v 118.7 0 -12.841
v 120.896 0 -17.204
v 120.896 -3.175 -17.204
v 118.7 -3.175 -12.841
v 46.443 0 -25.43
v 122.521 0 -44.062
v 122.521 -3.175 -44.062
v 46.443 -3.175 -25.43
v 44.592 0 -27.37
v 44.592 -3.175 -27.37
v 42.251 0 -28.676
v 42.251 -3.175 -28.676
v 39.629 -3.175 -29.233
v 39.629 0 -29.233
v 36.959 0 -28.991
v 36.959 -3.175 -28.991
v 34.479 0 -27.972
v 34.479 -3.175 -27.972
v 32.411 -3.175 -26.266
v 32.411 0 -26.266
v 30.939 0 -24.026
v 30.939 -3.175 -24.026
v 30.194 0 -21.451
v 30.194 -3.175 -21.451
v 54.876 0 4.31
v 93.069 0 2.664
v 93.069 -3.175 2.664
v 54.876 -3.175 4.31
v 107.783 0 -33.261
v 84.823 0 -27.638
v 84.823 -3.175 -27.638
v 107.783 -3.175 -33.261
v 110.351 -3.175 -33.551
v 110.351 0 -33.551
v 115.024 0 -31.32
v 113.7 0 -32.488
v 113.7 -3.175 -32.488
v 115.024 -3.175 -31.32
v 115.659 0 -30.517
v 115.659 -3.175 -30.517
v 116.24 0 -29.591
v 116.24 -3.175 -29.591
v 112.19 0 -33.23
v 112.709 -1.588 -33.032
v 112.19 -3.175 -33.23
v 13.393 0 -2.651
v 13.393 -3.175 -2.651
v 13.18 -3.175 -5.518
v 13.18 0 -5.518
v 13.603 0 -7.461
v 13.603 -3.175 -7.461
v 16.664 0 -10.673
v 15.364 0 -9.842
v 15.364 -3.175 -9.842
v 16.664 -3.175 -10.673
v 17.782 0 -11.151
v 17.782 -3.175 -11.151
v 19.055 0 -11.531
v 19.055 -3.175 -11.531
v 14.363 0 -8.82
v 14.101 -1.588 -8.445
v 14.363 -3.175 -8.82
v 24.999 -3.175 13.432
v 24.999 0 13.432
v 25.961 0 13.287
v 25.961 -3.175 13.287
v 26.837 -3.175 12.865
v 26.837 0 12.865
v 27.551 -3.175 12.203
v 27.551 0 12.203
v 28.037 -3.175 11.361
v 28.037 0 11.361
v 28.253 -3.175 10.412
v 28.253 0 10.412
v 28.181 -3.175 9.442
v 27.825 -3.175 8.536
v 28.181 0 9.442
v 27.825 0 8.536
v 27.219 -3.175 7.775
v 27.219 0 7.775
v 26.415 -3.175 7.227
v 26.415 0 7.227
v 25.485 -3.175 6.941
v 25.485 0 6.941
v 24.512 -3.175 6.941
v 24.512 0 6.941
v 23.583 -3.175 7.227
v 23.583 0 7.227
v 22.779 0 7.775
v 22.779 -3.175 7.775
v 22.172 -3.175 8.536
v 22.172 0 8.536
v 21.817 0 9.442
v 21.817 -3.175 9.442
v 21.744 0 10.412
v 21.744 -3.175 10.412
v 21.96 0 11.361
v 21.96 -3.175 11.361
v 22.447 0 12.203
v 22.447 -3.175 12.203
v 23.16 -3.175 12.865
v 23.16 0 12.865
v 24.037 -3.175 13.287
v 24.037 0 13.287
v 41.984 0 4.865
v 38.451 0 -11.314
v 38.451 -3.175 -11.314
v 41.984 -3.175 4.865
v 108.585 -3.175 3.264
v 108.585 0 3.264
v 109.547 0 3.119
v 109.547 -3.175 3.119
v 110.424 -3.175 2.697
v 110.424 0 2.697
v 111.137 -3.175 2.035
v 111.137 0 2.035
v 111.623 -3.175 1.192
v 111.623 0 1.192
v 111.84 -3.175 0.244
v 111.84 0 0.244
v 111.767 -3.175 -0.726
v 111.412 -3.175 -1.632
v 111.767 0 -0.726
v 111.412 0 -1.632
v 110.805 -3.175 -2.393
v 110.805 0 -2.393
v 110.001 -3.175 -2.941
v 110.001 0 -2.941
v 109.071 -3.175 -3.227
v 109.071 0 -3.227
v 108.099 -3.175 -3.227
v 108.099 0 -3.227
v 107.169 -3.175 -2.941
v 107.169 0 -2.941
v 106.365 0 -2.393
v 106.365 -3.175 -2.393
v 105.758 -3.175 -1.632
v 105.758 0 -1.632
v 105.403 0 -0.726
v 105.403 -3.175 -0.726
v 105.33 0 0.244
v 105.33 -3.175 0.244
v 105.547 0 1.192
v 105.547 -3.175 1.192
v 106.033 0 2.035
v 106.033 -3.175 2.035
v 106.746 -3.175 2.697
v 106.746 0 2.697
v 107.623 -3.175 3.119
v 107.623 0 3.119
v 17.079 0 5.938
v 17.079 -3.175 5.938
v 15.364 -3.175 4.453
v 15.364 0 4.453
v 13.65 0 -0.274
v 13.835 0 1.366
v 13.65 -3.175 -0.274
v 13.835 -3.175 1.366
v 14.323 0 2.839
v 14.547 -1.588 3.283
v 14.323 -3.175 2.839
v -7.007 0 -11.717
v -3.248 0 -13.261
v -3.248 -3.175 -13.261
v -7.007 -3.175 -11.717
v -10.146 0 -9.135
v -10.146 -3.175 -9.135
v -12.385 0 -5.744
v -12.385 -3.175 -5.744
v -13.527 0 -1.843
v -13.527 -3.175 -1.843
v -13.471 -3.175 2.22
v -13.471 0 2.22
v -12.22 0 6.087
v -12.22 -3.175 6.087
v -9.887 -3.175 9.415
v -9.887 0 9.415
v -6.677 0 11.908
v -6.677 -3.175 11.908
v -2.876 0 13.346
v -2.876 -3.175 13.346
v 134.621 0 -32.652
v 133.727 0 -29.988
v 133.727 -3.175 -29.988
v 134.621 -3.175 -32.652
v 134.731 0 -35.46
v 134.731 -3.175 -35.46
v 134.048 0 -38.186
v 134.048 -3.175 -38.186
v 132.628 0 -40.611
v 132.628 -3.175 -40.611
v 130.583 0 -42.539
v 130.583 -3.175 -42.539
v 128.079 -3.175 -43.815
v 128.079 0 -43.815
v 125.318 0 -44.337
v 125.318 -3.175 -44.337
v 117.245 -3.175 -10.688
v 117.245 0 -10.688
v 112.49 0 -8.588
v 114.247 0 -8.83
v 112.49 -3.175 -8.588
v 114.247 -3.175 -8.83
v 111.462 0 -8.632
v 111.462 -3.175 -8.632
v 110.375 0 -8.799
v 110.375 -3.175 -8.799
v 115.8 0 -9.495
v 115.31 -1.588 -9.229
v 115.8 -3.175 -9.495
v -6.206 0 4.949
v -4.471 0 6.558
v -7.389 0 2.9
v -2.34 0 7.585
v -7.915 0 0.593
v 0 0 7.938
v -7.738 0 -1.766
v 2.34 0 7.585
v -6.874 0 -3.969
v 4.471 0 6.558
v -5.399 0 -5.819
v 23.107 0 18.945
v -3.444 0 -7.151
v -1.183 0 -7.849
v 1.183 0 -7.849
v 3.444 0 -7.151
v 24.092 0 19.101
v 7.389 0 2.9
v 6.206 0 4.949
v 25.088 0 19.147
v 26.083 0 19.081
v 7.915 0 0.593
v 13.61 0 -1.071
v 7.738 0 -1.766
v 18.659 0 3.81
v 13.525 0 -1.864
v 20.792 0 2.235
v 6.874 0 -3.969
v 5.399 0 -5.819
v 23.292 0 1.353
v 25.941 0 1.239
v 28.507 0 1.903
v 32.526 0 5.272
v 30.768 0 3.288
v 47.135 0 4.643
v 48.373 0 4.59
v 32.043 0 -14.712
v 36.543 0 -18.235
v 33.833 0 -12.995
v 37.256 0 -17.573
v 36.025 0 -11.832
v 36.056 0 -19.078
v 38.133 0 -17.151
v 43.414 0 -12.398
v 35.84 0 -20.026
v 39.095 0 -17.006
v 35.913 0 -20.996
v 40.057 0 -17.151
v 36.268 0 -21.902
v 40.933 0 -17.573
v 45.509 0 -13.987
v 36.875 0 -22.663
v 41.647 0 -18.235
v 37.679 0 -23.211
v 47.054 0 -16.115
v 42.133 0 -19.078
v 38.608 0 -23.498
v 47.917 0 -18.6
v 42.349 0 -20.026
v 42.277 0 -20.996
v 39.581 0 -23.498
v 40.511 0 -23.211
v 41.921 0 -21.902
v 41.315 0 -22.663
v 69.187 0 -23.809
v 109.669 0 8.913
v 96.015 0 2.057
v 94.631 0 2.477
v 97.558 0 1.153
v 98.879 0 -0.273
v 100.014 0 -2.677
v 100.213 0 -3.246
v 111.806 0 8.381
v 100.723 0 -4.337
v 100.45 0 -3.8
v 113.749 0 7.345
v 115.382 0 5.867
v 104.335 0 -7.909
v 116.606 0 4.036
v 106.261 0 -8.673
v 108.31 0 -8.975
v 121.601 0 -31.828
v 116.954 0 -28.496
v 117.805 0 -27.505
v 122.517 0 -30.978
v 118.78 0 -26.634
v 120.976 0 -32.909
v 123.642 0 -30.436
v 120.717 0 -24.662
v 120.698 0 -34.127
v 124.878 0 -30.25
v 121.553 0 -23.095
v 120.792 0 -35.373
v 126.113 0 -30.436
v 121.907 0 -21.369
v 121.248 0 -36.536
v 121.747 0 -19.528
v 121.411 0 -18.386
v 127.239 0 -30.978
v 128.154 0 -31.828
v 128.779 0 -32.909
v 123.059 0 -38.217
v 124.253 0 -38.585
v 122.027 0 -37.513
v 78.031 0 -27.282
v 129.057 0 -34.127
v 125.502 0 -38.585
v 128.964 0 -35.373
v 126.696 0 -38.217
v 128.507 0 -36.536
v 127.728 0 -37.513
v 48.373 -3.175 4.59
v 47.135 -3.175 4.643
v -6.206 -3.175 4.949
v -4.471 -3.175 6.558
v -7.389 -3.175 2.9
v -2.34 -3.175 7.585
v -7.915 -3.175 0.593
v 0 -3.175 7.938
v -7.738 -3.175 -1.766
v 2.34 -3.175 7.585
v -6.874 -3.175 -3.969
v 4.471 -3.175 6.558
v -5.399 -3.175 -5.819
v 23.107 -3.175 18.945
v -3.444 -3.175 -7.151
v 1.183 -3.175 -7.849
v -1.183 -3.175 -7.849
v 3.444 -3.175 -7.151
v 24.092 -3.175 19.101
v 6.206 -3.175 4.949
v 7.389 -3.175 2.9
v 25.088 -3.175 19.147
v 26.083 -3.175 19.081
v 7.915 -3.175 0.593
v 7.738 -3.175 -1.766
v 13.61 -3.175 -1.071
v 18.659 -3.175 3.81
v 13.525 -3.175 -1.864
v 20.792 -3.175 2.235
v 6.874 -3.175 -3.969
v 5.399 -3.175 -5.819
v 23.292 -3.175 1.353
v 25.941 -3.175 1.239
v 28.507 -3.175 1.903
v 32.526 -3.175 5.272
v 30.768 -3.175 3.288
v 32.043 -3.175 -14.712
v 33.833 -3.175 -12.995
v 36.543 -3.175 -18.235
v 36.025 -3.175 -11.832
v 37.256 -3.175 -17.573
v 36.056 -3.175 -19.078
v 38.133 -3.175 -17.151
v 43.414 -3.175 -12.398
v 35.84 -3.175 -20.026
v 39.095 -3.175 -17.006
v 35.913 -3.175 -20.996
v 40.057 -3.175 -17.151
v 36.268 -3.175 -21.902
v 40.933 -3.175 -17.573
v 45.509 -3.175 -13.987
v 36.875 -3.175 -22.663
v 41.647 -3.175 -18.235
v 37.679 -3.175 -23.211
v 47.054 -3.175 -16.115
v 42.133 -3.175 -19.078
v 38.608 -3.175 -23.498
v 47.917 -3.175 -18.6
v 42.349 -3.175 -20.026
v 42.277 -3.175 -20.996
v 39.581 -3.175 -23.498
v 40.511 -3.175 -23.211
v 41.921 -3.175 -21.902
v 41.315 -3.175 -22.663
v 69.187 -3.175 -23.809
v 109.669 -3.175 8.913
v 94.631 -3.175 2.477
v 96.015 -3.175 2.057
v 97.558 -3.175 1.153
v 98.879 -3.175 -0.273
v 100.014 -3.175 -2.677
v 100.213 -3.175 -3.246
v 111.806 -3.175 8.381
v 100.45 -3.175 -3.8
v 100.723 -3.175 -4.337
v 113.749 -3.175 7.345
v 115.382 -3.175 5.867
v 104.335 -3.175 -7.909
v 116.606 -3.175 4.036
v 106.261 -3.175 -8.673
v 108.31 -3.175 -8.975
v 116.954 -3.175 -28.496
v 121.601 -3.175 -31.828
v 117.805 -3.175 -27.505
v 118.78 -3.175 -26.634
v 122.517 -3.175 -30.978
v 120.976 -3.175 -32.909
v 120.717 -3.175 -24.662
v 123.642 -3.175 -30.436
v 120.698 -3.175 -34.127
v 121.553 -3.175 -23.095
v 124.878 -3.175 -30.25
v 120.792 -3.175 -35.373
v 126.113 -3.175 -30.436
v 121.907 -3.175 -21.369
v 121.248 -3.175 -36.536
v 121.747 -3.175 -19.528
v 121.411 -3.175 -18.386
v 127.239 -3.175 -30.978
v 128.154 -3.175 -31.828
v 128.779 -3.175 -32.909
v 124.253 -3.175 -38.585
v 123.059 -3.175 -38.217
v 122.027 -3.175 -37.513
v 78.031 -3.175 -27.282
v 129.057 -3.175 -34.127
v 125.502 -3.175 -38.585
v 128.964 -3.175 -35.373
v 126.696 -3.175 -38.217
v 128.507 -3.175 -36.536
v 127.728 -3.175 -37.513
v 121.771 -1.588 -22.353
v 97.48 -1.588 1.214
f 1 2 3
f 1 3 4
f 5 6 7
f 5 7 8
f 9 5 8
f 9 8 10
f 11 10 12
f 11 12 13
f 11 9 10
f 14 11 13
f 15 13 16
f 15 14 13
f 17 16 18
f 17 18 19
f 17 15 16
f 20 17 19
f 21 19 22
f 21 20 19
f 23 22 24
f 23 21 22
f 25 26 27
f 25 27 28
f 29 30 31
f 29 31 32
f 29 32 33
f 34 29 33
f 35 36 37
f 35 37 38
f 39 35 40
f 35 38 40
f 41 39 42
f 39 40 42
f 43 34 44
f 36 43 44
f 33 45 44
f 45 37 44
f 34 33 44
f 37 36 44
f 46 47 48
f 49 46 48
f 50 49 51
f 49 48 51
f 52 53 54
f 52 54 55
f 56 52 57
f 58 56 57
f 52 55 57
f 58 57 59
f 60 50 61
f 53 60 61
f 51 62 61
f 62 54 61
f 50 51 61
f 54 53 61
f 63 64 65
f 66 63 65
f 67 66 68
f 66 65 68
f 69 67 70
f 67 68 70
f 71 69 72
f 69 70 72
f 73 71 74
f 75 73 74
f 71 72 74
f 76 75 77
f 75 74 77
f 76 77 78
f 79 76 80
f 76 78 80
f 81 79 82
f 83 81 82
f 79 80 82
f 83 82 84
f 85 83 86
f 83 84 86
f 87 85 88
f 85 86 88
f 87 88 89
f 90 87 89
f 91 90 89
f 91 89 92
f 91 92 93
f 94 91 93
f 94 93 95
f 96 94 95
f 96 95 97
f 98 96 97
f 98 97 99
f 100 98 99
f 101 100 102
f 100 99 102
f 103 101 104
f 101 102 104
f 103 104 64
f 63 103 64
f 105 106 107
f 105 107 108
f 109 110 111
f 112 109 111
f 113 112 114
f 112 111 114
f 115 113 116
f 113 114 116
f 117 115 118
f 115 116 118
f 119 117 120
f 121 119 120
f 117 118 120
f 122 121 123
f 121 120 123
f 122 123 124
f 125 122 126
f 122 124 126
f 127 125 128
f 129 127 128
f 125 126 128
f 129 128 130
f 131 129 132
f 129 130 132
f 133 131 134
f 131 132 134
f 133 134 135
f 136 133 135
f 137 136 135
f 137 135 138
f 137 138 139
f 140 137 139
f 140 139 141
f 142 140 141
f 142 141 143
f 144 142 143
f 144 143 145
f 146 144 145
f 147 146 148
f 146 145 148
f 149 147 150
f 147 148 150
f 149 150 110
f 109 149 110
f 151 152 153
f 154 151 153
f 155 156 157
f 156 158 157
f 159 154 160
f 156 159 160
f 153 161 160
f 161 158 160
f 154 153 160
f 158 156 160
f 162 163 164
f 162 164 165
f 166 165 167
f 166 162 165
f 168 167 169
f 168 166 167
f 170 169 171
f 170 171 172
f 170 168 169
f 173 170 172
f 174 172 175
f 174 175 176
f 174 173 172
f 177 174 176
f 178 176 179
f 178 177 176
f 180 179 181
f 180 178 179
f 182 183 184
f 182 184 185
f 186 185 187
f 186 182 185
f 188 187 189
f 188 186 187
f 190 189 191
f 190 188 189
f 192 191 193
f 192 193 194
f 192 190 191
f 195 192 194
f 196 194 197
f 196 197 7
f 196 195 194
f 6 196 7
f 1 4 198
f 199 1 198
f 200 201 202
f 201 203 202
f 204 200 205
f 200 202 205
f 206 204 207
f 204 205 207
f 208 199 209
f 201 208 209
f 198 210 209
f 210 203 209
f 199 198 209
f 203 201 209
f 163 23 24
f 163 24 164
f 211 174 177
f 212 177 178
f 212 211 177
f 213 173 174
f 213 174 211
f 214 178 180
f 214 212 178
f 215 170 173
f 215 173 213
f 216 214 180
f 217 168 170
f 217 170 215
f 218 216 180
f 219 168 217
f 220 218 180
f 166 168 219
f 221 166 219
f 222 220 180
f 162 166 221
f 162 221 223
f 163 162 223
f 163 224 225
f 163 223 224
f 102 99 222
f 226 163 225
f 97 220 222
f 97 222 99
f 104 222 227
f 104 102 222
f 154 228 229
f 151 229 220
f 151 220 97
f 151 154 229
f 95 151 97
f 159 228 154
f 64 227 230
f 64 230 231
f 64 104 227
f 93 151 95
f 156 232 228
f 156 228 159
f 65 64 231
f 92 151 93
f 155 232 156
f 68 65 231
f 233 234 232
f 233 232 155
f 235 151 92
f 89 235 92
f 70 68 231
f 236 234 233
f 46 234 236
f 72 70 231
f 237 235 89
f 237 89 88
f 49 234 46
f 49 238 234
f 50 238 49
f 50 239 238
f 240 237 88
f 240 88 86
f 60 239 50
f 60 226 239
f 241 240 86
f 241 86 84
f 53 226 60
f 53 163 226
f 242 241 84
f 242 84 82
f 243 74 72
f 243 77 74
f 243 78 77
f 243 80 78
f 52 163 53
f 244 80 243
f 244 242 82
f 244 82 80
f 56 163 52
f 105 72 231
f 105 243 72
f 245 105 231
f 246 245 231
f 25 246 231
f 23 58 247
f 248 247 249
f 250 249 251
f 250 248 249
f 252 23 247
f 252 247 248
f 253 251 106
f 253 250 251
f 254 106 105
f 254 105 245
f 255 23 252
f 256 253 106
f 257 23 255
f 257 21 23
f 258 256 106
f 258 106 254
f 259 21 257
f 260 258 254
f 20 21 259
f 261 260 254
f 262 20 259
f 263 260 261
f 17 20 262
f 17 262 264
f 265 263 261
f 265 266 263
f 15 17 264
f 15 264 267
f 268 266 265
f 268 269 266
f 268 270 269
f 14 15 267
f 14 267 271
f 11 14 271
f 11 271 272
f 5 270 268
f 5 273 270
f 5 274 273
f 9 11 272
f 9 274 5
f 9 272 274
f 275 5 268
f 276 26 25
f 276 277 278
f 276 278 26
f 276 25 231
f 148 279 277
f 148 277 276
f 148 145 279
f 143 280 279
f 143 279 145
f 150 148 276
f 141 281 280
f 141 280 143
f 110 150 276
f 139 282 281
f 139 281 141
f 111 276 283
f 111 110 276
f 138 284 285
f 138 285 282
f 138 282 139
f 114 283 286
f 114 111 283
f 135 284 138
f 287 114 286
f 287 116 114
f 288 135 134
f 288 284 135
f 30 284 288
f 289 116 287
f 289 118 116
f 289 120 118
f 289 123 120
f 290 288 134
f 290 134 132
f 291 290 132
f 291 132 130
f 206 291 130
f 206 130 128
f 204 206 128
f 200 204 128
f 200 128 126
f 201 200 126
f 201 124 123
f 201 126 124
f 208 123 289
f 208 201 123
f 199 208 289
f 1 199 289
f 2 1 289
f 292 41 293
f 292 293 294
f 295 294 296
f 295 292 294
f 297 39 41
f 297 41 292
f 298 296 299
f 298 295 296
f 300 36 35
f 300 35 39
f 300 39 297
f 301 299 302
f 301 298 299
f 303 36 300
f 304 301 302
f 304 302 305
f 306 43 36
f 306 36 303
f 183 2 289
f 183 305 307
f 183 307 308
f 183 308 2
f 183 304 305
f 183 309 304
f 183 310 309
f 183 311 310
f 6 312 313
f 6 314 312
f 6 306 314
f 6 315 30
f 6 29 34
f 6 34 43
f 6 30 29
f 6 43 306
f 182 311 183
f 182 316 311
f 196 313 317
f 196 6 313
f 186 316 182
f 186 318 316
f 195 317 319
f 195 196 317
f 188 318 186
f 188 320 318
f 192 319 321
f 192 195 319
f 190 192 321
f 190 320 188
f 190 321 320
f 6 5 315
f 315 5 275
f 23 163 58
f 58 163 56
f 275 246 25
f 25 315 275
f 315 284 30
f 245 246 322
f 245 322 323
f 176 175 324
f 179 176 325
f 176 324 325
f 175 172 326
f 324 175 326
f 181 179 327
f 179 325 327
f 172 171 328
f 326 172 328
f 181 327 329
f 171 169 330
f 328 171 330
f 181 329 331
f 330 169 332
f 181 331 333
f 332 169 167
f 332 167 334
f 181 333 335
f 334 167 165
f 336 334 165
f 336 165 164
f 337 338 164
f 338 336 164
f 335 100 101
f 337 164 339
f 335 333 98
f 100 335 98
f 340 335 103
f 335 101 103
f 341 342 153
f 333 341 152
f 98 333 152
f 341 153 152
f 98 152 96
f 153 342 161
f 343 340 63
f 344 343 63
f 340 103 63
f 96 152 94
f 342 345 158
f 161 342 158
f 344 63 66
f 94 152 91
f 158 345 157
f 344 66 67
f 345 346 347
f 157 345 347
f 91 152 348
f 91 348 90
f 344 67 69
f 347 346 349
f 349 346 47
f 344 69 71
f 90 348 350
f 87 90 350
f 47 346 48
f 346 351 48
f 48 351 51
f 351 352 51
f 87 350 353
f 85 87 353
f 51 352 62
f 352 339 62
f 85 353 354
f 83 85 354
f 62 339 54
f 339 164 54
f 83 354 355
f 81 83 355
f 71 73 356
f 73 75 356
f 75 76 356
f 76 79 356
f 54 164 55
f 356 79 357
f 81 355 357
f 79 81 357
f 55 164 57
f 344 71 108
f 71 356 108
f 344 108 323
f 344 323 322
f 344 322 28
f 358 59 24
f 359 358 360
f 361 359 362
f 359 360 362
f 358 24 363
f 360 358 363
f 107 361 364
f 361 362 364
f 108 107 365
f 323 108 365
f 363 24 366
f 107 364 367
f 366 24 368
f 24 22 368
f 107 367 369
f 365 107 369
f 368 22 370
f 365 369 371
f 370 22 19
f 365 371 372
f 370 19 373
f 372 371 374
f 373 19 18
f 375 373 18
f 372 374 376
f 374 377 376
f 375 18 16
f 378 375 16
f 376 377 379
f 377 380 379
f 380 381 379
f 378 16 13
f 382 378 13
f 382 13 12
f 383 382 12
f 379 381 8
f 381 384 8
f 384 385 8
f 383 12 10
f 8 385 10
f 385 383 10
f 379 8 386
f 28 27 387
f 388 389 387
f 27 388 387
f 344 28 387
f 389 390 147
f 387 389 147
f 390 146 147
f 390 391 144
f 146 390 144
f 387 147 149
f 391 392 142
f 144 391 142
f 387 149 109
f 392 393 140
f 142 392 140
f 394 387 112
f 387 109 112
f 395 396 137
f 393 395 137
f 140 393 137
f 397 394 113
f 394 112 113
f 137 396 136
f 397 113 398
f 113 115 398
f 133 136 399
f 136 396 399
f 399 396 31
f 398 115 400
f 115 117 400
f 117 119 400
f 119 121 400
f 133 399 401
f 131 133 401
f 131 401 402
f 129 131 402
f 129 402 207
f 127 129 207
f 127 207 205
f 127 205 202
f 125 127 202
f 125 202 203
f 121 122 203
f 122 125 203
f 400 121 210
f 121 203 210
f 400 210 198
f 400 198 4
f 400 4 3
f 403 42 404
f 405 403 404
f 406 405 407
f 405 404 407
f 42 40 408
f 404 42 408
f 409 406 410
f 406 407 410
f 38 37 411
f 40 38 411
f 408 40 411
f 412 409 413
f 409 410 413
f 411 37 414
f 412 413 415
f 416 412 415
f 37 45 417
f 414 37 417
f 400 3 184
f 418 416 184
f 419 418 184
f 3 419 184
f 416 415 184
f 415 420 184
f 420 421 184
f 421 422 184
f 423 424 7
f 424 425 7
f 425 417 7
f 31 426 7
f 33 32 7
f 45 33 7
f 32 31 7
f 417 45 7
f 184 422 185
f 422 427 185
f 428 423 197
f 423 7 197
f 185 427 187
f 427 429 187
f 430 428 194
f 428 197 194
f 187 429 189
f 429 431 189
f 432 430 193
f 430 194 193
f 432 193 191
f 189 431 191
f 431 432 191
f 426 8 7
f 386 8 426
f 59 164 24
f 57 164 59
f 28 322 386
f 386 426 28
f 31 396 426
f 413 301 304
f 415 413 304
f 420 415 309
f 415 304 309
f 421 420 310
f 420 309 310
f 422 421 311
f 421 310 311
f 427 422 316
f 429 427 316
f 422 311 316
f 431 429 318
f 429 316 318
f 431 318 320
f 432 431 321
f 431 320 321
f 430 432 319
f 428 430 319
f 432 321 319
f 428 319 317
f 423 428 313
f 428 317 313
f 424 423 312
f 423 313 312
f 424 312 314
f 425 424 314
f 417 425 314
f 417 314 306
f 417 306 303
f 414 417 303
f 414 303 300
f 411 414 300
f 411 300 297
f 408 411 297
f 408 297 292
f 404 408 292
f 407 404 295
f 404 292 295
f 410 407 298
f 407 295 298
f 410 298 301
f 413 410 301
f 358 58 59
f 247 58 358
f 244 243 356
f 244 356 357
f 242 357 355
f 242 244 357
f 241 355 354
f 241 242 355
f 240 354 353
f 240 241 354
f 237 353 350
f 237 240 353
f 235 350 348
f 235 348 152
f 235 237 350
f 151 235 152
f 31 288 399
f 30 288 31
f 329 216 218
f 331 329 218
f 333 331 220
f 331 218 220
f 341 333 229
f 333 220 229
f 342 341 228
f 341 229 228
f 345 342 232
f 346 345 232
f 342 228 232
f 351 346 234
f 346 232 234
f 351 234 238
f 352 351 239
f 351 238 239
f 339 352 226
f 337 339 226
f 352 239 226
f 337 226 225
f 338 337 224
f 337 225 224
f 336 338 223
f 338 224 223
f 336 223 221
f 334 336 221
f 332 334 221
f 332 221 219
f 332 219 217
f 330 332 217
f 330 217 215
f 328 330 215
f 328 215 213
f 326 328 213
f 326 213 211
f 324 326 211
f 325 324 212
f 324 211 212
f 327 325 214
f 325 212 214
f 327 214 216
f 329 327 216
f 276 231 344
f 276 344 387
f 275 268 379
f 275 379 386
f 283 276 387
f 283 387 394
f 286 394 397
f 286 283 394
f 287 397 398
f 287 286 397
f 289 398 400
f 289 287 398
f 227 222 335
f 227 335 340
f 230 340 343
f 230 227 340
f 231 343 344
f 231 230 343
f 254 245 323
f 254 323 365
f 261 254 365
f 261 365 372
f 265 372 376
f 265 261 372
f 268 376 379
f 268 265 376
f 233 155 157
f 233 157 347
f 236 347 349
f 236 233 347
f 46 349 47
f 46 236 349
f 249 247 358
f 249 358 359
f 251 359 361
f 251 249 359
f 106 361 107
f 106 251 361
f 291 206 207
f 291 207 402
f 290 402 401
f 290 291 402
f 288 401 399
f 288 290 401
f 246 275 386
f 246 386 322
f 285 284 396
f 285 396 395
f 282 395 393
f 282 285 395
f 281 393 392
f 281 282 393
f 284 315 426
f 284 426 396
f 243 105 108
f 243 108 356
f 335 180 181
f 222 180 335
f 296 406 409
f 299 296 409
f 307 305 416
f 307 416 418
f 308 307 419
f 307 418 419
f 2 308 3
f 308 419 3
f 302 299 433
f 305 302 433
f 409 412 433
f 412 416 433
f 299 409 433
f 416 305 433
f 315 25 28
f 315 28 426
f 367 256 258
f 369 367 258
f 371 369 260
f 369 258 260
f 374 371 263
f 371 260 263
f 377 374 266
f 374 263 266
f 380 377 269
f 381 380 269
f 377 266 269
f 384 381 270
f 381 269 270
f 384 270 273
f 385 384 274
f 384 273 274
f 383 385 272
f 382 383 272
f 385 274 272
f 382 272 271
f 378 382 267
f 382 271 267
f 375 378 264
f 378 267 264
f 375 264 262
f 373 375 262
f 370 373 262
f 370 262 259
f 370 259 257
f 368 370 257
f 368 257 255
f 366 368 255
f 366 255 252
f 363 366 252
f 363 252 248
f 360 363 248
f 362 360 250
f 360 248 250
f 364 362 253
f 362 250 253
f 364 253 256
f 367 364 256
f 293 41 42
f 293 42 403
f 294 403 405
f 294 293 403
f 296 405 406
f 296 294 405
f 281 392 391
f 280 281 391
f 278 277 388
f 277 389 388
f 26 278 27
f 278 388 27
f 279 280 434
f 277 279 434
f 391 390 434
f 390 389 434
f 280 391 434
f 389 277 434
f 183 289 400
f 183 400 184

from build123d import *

# Parameters (mm, degrees)
SKETCH1_R           = 3.2639
SKETCH1_R_2         = 7.9375
SKETCH1_R_3         = 4.191
BOSS_EXTRUDE4_DEPTH = 3.175
FILLET1_START       = -3.175
FILLET1_DEPTH       = 3.175


with BuildPart() as part:
    # Sketch1 → Boss-Extrude4 (new body)
    with BuildSketch(Plane(origin=(0, 0, 0), x_dir=(1, 0, 0), z_dir=(0, 1, 0))):
        with BuildLine():
            ThreePointArc((133.726592386, 29.98785526), (132.627611185, 40.61059676), (122.521356715, 44.06226552))
            Line((122.521356715, 44.06226552), (46.442862481, 25.430137021))
            ThreePointArc((46.442862481, 25.430137021), (36.958837973, 28.991331503), (30.193743977, 21.450619984))
            Line((30.193743977, 21.450619984), (-3.247611444, 13.260609947))
            ThreePointArc((-3.247611444, 13.260609947), (-13.651169136, -0.190623903), (-2.876077052, -13.346120674))
            Line((-2.876077052, -13.346120674), (23.107180797, -18.945489468))
            ThreePointArc((23.107180797, -18.945489468), (24.589406384, -19.137653713), (26.082973185, -19.081279984))
            Line((26.082973185, -19.081279984), (109.669270086, -8.913192671))
            ThreePointArc((109.669270086, -8.913192671), (113.749462268, -7.344996575), (116.60566957, -4.036025875))
            Line((116.60566957, -4.036025875), (133.726592386, 29.98785526))
        make_face()
        with Locations(Location((24.998703099, -10.168087313, 0), (0, 0, 270))):
            Circle(SKETCH1_R, mode=Mode.SUBTRACT)
        with Locations(Location((0, 0, 0), (0, 0, 270))):
            Circle(SKETCH1_R_2, mode=Mode.SUBTRACT)
        with BuildLine():
            Line((38.450716367, 11.314391845), (41.984168993, -4.864970405))
            Line((41.984168993, -4.864970405), (32.525550861, -5.272455792))
            ThreePointArc((32.525550861, -5.272455792), (24.612242842, -1.197507974), (17.07870805, -5.937919038))
            Line((17.07870805, -5.937919038), (12.189591197, -6.148546389))
            ThreePointArc((12.189591197, -6.148546389), (13.515826194, 1.926966151), (9.985636063, 9.310092839))
            Line((9.985636063, 9.310092839), (32.042893317, 14.712061629))
            ThreePointArc((32.042893317, 14.712061629), (34.888474765, 12.337435423), (38.450716367, 11.314391845))
        make_face(mode=Mode.SUBTRACT)
        with Locations(Location((39.094708942, 20.270167566, 0), (0, 0, 270))):
            Circle(SKETCH1_R, mode=Mode.SUBTRACT)
        with BuildLine():
            Line((54.876229285, -4.309569382), (78.030840873, 27.282347644))
            Line((78.030840873, 27.282347644), (100.723144875, 4.337266328))
            ThreePointArc((100.723144875, 4.337266328), (99.66914772, 1.062178575), (99.924218758, -2.368863331))
            Line((99.924218758, -2.368863331), (54.876229285, -4.309569382))
        make_face(mode=Mode.SUBTRACT)
        with BuildLine():
            Line((104.335087932, 7.90941797), (84.823475635, 27.638376771))
            Line((84.823475635, 27.638376771), (114.98908268, 35.026134276))
            ThreePointArc((114.98908268, 35.026134276), (117.570132445, 27.752761279), (124.58688197, 24.538885311))
            Line((124.58688197, 24.538885311), (115.260501822, 6.004858086))
            ThreePointArc((115.260501822, 6.004858086), (110.126982004, 8.845503757), (104.335087932, 7.90941797))
        make_face(mode=Mode.SUBTRACT)
        with Locations(Location((108.585, 0, 0), (0, 0, 270))):
            Circle(SKETCH1_R, mode=Mode.SUBTRACT)
        with BuildLine():
            Line((47.13543811, -4.64304931), (43.413738486, 12.398279038))
            ThreePointArc((43.413738486, 12.398279038), (46.36017499, 14.994407118), (47.916850432, 18.599699151))
            Line((47.916850432, 18.599699151), (69.18664036, 23.808811963))
            Line((69.18664036, 23.808811963), (48.372525925, -4.589754505))
            Line((48.372525925, -4.589754505), (47.13543811, -4.64304931))
        make_face(mode=Mode.SUBTRACT)
        with Locations(Location((124.877763158, 34.440613651, 0), (0, 0, 270))):
            Circle(SKETCH1_R_3, mode=Mode.SUBTRACT)
    extrude(amount=-BOSS_EXTRUDE4_DEPTH)

    # Fillet1: read off the stored shape, not the designer's step
    # Fillet1 outline → Fillet1 (add)
    with BuildSketch(Plane(origin=(0, 0, 0), x_dir=(1, 0, 0), z_dir=(0, 1, 0)).offset(FILLET1_START)):
        with BuildLine():
            Line((114.98908268, 35.026134276), (107.783269008, 33.261382651))
            add(Edge.make_bspline(
                [(107.783269008, 33.261382651), (113.406008329, 34.638428853), (116.240182309, 29.590764883)],
                knots=[0, 0, 0, 1, 1, 1], degree=2))
            ThreePointArc((116.240182309, 29.590764883), (115.224193881, 32.218579403), (114.98908268, 35.026134276))
        make_face()
        with BuildLine():
            Line((115.260501822, 6.004858086), (118.700286007, 12.840634961))
            add(Edge.make_bspline(
                [(118.700286007, 12.840634961), (116.082209563, 7.637812501), (110.374675184, 8.798733315)],
                knots=[0, 0, 0, 1, 1, 1], degree=2))
            ThreePointArc((110.374675184, 8.798733315), (113.042156059, 7.794511215), (115.260501822, 6.004858086))
        make_face()
        with BuildLine():
            ThreePointArc((124.58688197, 24.538885311), (121.515947768, 25.122511201), (118.779768978, 26.633994475))
            add(Edge.make_bspline(
                [(118.779768978, 26.633994475), (123.70514236, 22.786631417), (120.895795937, 17.203704037)],
                knots=[0, 0, 0, 1, 1, 1], degree=2))
            Line((120.895795937, 17.203704037), (124.58688197, 24.538885311))
        make_face()
        with BuildLine():
            ThreePointArc((9.985636063, 9.310092839), (12.154183418, 6.21824587), (13.392725611, 2.650595587))
            add(Edge.make_bspline(
                [(13.392725611, 2.650595587), (11.978146555, 9.798071891), (19.055114913, 11.531268442)],
                knots=[0, 0, 0, 1, 1, 1], degree=2))
            Line((19.055114913, 11.531268442), (9.985636063, 9.310092839))
        make_face()
        with BuildLine():
            add(Edge.make_bspline(
                [(17.07870805, -5.937919038), (13.730219916, -3.733889963), (13.649749039, 0.274057316)],
                knots=[0, 0, 0, 1, 1, 1], degree=2))
            ThreePointArc((13.649749039, 0.274057316), (13.312788421, -3.026618691), (12.189591197, -6.148546389))
            Line((12.189591197, -6.148546389), (17.07870805, -5.937919038))
        make_face()
        with BuildLine():
            ThreePointArc((99.924218758, -2.368863331), (99.607534733, 0.160507278), (100.014432232, 2.67694104))
            add(Edge.make_bspline(
                [(100.014432232, 2.67694104), (98.418154374, -2.433745878), (93.068937879, -2.664194715)],
                knots=[0, 0, 0, 1, 1, 1], degree=2))
            Line((93.068937879, -2.664194715), (99.924218758, -2.368863331))
        make_face()
    extrude(amount=FILLET1_DEPTH)


solid = part.part
